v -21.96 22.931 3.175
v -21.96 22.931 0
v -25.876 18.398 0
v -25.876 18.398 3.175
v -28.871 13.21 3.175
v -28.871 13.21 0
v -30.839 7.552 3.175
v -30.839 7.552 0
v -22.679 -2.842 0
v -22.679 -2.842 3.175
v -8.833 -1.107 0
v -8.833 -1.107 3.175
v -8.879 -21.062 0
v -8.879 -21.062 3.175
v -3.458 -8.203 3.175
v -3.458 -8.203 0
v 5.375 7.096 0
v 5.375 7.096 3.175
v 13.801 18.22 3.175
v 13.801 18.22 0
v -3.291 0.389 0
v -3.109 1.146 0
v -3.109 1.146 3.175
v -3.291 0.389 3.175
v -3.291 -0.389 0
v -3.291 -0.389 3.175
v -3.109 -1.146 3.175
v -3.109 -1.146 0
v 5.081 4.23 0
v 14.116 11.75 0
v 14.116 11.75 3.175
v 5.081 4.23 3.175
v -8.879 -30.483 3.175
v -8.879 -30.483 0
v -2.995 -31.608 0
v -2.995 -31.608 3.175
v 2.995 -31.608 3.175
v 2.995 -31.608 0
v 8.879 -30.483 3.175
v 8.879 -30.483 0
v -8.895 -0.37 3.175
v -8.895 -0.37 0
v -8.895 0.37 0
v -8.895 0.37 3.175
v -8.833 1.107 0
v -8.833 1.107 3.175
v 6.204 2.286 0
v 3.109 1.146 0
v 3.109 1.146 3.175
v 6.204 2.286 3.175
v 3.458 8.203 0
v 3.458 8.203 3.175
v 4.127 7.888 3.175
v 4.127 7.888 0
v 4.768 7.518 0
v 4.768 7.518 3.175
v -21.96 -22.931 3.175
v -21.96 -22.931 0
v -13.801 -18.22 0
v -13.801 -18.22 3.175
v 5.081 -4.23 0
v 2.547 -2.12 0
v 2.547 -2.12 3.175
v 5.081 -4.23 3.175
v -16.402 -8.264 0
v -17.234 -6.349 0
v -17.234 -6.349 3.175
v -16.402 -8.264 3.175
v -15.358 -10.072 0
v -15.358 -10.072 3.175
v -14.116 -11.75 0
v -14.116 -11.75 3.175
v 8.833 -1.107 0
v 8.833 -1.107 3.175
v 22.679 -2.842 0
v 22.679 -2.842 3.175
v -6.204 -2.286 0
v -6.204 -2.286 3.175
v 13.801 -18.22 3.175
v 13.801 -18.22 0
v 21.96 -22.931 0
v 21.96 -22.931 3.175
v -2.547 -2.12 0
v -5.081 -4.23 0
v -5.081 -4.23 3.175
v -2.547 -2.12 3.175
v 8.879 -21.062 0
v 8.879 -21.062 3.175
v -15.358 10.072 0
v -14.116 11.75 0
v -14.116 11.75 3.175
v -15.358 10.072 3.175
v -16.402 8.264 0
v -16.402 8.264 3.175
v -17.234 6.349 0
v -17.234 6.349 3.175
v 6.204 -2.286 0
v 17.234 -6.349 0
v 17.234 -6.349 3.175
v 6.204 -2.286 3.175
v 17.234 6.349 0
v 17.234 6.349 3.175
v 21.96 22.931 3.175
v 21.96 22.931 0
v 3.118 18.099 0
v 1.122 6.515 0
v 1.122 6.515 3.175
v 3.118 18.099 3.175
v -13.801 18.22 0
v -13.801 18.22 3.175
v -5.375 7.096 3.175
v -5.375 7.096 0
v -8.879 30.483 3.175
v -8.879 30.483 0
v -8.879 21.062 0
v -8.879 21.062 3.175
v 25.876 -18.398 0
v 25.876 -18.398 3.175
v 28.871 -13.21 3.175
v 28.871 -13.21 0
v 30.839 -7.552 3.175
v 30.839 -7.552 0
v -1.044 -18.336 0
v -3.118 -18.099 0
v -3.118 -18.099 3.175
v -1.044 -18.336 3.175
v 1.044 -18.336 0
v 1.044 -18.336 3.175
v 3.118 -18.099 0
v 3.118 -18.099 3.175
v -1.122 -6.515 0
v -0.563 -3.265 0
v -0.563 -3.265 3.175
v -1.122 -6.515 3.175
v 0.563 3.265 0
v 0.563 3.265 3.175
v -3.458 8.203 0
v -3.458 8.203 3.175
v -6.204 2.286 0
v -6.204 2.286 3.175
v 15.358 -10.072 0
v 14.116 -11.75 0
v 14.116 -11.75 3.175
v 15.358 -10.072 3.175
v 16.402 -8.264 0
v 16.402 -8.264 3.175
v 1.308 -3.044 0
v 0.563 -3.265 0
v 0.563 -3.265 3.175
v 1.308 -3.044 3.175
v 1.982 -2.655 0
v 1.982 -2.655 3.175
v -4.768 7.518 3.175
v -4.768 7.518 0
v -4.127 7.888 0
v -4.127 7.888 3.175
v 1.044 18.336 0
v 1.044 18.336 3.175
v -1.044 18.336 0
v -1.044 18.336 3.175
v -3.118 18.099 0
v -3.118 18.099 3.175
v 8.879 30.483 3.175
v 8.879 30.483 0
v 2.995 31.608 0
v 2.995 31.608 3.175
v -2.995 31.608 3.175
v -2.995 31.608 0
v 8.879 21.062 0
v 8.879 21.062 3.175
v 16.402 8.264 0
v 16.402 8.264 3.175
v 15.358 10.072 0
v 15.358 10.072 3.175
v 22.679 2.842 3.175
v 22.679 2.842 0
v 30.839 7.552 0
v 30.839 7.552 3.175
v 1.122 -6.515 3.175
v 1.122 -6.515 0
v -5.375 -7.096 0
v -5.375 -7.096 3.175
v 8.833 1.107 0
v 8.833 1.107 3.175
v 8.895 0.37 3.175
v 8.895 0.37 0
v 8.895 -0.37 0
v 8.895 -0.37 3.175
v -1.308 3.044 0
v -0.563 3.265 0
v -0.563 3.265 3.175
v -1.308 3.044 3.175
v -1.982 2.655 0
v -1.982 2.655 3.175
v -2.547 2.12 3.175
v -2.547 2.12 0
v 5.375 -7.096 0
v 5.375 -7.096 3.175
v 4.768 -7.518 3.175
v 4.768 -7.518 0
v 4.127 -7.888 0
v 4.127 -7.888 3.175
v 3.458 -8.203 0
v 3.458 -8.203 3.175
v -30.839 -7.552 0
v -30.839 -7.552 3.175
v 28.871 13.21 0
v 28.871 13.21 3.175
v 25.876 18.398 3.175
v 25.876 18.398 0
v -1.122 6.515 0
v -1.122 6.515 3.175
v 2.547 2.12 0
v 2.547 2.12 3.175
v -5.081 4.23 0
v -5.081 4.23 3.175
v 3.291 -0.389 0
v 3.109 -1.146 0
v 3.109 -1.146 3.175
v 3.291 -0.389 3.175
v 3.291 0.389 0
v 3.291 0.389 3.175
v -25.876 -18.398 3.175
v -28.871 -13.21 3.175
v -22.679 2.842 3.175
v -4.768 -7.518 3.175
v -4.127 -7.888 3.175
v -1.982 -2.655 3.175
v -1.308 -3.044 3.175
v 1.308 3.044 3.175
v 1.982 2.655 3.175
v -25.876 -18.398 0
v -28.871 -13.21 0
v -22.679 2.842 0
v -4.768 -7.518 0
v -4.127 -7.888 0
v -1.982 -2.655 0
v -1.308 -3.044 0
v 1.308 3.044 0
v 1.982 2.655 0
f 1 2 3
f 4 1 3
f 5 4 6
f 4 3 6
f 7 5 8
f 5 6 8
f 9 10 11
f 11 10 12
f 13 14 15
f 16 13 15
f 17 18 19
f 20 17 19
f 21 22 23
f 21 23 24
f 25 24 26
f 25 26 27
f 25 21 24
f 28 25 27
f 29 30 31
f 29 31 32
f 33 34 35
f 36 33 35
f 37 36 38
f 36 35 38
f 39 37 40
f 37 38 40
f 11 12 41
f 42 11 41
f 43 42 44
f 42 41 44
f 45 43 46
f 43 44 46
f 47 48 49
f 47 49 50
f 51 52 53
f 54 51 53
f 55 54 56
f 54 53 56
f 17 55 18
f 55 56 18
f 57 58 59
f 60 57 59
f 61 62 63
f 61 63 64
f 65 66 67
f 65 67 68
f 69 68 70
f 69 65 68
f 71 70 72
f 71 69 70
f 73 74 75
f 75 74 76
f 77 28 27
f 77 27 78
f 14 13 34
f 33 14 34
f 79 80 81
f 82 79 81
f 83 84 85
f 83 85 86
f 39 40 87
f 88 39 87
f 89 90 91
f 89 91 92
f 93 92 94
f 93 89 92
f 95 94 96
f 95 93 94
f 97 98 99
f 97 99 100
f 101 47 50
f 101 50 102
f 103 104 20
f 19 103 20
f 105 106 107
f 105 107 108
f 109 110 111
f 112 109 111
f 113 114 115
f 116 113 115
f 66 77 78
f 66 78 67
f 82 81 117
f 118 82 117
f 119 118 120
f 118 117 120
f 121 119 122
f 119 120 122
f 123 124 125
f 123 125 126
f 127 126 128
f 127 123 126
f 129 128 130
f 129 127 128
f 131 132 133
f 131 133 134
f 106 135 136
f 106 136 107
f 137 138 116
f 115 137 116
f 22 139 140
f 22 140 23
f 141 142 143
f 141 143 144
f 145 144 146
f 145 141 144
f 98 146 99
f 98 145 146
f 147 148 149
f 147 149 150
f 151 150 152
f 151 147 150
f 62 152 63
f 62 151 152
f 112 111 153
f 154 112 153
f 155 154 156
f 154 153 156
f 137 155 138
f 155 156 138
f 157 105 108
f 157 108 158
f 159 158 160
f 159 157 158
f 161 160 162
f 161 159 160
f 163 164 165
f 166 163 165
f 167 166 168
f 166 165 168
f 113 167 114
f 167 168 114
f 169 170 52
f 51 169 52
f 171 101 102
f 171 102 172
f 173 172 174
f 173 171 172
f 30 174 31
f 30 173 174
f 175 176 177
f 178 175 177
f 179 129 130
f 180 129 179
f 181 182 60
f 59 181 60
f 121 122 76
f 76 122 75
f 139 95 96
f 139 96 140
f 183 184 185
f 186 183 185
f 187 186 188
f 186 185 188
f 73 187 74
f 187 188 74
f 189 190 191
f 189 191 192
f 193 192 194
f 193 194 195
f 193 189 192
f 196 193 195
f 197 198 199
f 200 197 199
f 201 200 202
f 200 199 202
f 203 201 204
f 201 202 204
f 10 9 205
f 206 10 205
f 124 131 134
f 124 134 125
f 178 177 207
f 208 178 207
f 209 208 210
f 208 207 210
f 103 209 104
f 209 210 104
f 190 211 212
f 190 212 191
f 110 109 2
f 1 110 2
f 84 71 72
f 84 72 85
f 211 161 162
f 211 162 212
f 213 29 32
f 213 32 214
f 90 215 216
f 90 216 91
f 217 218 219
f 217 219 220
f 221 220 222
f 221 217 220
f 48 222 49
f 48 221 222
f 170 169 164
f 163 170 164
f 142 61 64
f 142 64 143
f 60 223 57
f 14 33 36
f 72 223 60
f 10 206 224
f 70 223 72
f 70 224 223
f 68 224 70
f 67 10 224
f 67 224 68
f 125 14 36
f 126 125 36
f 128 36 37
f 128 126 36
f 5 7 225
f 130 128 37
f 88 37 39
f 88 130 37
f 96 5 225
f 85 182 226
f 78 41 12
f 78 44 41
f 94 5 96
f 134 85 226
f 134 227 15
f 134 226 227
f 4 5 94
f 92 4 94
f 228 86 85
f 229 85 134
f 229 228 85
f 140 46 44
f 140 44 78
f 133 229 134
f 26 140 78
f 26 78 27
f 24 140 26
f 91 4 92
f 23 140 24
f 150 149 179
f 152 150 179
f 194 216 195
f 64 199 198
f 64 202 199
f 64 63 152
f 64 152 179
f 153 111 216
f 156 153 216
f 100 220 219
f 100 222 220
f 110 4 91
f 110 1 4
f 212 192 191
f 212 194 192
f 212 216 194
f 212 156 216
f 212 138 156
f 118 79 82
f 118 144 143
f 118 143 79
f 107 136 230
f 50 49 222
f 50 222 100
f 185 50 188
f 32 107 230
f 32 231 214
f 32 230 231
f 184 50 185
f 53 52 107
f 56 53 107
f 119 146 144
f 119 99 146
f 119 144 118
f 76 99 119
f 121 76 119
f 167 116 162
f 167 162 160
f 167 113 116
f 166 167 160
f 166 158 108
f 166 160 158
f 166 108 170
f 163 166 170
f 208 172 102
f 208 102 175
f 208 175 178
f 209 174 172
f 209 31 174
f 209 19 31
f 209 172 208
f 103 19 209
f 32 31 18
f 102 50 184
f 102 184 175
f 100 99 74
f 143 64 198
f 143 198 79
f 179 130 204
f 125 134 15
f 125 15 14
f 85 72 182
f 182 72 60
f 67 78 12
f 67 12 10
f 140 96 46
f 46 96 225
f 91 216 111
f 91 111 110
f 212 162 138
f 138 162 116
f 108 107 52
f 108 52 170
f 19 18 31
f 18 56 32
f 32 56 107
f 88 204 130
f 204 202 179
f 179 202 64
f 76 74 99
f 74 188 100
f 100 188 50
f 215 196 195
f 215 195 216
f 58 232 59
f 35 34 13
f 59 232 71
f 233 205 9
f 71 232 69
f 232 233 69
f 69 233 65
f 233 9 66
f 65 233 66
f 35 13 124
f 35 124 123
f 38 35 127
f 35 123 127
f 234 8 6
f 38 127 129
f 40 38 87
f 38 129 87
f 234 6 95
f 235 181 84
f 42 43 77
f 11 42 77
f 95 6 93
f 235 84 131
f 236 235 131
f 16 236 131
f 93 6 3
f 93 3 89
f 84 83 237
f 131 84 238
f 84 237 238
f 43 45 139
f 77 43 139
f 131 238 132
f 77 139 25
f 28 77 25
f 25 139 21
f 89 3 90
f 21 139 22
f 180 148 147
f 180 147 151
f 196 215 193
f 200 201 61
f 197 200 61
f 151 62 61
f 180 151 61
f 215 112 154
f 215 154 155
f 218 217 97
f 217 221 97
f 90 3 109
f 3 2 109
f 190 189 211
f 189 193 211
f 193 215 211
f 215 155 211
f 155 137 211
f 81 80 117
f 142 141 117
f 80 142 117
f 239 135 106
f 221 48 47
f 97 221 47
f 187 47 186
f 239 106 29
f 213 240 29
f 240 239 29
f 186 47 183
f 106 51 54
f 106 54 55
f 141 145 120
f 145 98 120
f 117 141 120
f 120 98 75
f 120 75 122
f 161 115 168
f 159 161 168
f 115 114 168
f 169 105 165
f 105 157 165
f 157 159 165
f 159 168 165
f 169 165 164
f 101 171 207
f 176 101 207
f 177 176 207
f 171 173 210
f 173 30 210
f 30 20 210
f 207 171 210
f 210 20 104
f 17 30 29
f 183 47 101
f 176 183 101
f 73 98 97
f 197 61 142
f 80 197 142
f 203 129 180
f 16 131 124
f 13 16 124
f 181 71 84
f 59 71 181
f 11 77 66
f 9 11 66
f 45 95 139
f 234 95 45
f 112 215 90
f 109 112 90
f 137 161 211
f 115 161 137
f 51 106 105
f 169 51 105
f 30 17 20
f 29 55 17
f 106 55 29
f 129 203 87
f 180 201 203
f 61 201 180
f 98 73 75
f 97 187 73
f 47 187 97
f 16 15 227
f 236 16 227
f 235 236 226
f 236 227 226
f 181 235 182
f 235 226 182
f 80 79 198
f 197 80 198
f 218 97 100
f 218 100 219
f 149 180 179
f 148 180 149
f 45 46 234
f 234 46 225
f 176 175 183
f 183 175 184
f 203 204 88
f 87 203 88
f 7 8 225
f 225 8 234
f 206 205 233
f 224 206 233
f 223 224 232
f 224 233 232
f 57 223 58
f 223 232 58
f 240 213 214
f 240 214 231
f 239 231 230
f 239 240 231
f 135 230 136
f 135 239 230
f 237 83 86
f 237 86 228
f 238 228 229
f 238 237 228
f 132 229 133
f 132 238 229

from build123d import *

# Parameters (mm, degrees)
EXTRUDE1_DEPTH     = 3.175
CUT_EXTRUDE1_DEPTH = 4.175


with BuildPart() as part:
    # Sketch1 → Extrude1 (new body)
    with BuildSketch(Plane.XY):
        with BuildLine():
            Line((22.679380466, 2.841623674), (30.838674439, 7.552394246))
            ThreePointArc((30.838674439, 7.552394246), (27.49630657, 15.875), (21.959902496, 22.93087836))
            Line((21.959902496, 22.93087836), (13.800608523, 18.220107788))
            ThreePointArc((13.800608523, 18.220107788), (11.428354249, 19.794490207), (8.878771943, 21.061731462))
            Line((8.878771943, 21.061731462), (8.878771943, 30.483272606))
            ThreePointArc((8.878771943, 30.483272606), (0, 31.75), (-8.878771943, 30.483272606))
            Line((-8.878771943, 30.483272606), (-8.878771943, 21.061731462))
            ThreePointArc((-8.878771943, 21.061731462), (-11.42835425, 19.794490207), (-13.800608523, 18.220107788))
            Line((-13.800608523, 18.220107788), (-21.959902496, 22.93087836))
            ThreePointArc((-21.959902496, 22.93087836), (-27.49630657, 15.875), (-30.838674439, 7.552394246))
            Line((-30.838674439, 7.552394246), (-22.679380466, 2.841623674))
            ThreePointArc((-22.679380466, 2.841623674), (-22.856708499, 0), (-22.679380466, -2.841623674))
            Line((-22.679380466, -2.841623674), (-30.838674439, -7.552394246))
            ThreePointArc((-30.838674439, -7.552394246), (-27.49630657, -15.875), (-21.959902496, -22.93087836))
            Line((-21.959902496, -22.93087836), (-13.800608523, -18.220107788))
            ThreePointArc((-13.800608523, -18.220107788), (-11.428354249, -19.794490207), (-8.878771943, -21.061731462))
            Line((-8.878771943, -21.061731462), (-8.878771943, -30.483272606))
            ThreePointArc((-8.878771943, -30.483272606), (0, -31.75), (8.878771943, -30.483272606))
            Line((8.878771943, -30.483272606), (8.878771943, -21.061731462))
            ThreePointArc((8.878771943, -21.061731462), (11.42835425, -19.794490207), (13.800608523, -18.220107788))
            Line((13.800608523, -18.220107788), (21.959902496, -22.93087836))
            ThreePointArc((21.959902496, -22.93087836), (27.49630657, -15.875), (30.838674439, -7.552394246))
            Line((30.838674439, -7.552394246), (22.679380466, -2.841623674))
            ThreePointArc((22.679380466, -2.841623674), (22.856708499, 0), (22.679380466, 2.841623674))
        make_face()
        with BuildLine():
            Line((5.081146111, 4.229650041), (2.54665271, 2.119885858))
            ThreePointArc((2.54665271, 2.119885858), (1.656755595, 2.869584813), (0.562548705, 3.265408865))
            Line((0.562548705, 3.265408865), (1.122411451, 6.515226654))
            Line((1.122411451, 6.515226654), (3.118088913, 18.09947505))
            ThreePointArc((3.118088913, 18.09947505), (1.4e-08, 18.366095814), (-3.118088886, 18.09947505))
            Line((-3.118088886, 18.09947505), (-1.122411315, 6.515226635))
            Line((-1.122411315, 6.515226635), (-0.562548631, 3.265408874))
            ThreePointArc((-0.562548631, 3.265408874), (-1.656755527, 2.869584841), (-2.546652654, 2.119885903))
            Line((-2.546652654, 2.119885903), (-5.081146055, 4.22965016))
            Line((-5.081146055, 4.22965016), (-14.115560718, 11.750081737))
            ThreePointArc((-14.115560718, 11.750081737), (-15.90550552, 9.183047919), (-17.233649617, 6.349393341))
            Line((-17.233649617, 6.349393341), (-6.203557422, 2.285576607))
            Line((-6.203557422, 2.285576607), (-3.109201328, 1.145523033))
            ThreePointArc((-3.109201328, 1.145523033), (-3.313511107, 5e-08), (-3.109201345, -1.145522936))
            Line((-3.109201345, -1.145522936), (-6.203557501, -2.285576481))
            Line((-6.203557501, -2.285576481), (-17.233649626, -6.3493933))
            ThreePointArc((-17.233649626, -6.3493933), (-15.905505528, -9.183047878), (-14.115560727, -11.750081696))
            Line((-14.115560727, -11.750081696), (-5.081146102, -4.229650015))
            Line((-5.081146102, -4.229650015), (-2.546652687, -2.119885812))
            ThreePointArc((-2.546652687, -2.119885812), (-1.656755574, -2.869584762), (-0.562548689, -3.265408812))
            Line((-0.562548689, -3.265408812), (-1.122411442, -6.515226628))
            Line((-1.122411442, -6.515226628), (-3.118088903, -18.099475024))
            ThreePointArc((-3.118088903, -18.099475024), (-4e-09, -18.366095785), (3.118088895, -18.099475024))
            Line((3.118088895, -18.099475024), (1.122411325, -6.515226609))
            Line((1.122411325, -6.515226609), (0.562548643, -3.265408824))
            ThreePointArc((0.562548643, -3.265408824), (1.656755537, -2.869584794), (2.546652665, -2.119885861))
            Line((2.546652665, -2.119885861), (5.081146064, -4.229650134))
            Line((5.081146064, -4.229650134), (14.115560728, -11.750081711))
            ThreePointArc((14.115560728, -11.750081711), (15.905505529, -9.183047893), (17.233649627, -6.349393315))
            Line((17.233649627, -6.349393315), (6.203557431, -2.285576582))
            Line((6.203557431, -2.285576582), (3.109201343, -1.145522994))
            ThreePointArc((3.109201343, -1.145522994), (3.313511126, -1.1e-08), (3.109201368, 1.145522978))
            Line((3.109201368, 1.145522978), (6.203557511, 2.285576507))
            Line((6.203557511, 2.285576507), (17.233649636, 6.349393326))
            ThreePointArc((17.233649636, 6.349393326), (15.905505541, 9.183047906), (14.115560736, 11.750081722))
            Line((14.115560736, 11.750081722), (5.081146111, 4.229650041))
        make_face(mode=Mode.SUBTRACT)
    extrude(amount=EXTRUDE1_DEPTH)

    # Sketch2 → Cut-Extrude1 (cut, through all)
    with BuildSketch(Plane.XY.offset(3.175)):
        with BuildLine():
            Line((8.878771943, 21.061731462), (3.458150609, 8.203233505))
            ThreePointArc((3.458150609, 8.203233505), (4.451175282, 7.709661742), (5.375133304, 7.09646303))
            Line((5.375133304, 7.09646303), (13.800608523, 18.220107788))
            ThreePointArc((13.800608523, 18.220107788), (11.428354249, 19.794490207), (8.878771943, 21.061731462))
        make_face()
        with BuildLine():
            Line((22.679380466, 2.841623674), (8.833283913, 1.106770475))
            ThreePointArc((8.833283913, 1.106770475), (8.902350564, 0), (8.833283913, -1.106770475))
            Line((8.833283913, -1.106770475), (22.679380466, -2.841623674))
            ThreePointArc((22.679380466, -2.841623674), (22.856708499, 0), (22.679380466, 2.841623674))
        make_face()
        with BuildLine():
            Line((13.800608523, -18.220107788), (5.375133304, -7.09646303))
            ThreePointArc((5.375133304, -7.09646303), (4.451175282, -7.709661742), (3.458150609, -8.203233505))
            Line((3.458150609, -8.203233505), (8.878771943, -21.061731462))
            ThreePointArc((8.878771943, -21.061731462), (11.42835425, -19.794490207), (13.800608523, -18.220107788))
        make_face()
        with BuildLine():
            Line((-8.878771943, -21.061731462), (-3.458150609, -8.203233505))
            ThreePointArc((-3.458150609, -8.203233505), (-4.451175282, -7.709661742), (-5.375133304, -7.09646303))
            Line((-5.375133304, -7.09646303), (-13.800608523, -18.220107788))
            ThreePointArc((-13.800608523, -18.220107788), (-11.428354249, -19.794490207), (-8.878771943, -21.061731462))
        make_face()
        with BuildLine():
            Line((-22.679380466, -2.841623674), (-8.833283913, -1.106770475))
            ThreePointArc((-8.833283913, -1.106770475), (-8.902350564, 0), (-8.833283913, 1.106770475))
            Line((-8.833283913, 1.106770475), (-22.679380466, 2.841623674))
            ThreePointArc((-22.679380466, 2.841623674), (-22.856708499, 0), (-22.679380466, -2.841623674))
        make_face()
        with BuildLine():
            Line((-13.800608523, 18.220107788), (-5.375133304, 7.09646303))
            ThreePointArc((-5.375133304, 7.09646303), (-4.451175282, 7.709661742), (-3.458150609, 8.203233505))
            Line((-3.458150609, 8.203233505), (-8.878771943, 21.061731462))
            ThreePointArc((-8.878771943, 21.061731462), (-11.42835425, 19.794490207), (-13.800608523, 18.220107788))
        make_face()
    extrude(amount=-CUT_EXTRUDE1_DEPTH, mode=Mode.SUBTRACT)


solid = part.part
